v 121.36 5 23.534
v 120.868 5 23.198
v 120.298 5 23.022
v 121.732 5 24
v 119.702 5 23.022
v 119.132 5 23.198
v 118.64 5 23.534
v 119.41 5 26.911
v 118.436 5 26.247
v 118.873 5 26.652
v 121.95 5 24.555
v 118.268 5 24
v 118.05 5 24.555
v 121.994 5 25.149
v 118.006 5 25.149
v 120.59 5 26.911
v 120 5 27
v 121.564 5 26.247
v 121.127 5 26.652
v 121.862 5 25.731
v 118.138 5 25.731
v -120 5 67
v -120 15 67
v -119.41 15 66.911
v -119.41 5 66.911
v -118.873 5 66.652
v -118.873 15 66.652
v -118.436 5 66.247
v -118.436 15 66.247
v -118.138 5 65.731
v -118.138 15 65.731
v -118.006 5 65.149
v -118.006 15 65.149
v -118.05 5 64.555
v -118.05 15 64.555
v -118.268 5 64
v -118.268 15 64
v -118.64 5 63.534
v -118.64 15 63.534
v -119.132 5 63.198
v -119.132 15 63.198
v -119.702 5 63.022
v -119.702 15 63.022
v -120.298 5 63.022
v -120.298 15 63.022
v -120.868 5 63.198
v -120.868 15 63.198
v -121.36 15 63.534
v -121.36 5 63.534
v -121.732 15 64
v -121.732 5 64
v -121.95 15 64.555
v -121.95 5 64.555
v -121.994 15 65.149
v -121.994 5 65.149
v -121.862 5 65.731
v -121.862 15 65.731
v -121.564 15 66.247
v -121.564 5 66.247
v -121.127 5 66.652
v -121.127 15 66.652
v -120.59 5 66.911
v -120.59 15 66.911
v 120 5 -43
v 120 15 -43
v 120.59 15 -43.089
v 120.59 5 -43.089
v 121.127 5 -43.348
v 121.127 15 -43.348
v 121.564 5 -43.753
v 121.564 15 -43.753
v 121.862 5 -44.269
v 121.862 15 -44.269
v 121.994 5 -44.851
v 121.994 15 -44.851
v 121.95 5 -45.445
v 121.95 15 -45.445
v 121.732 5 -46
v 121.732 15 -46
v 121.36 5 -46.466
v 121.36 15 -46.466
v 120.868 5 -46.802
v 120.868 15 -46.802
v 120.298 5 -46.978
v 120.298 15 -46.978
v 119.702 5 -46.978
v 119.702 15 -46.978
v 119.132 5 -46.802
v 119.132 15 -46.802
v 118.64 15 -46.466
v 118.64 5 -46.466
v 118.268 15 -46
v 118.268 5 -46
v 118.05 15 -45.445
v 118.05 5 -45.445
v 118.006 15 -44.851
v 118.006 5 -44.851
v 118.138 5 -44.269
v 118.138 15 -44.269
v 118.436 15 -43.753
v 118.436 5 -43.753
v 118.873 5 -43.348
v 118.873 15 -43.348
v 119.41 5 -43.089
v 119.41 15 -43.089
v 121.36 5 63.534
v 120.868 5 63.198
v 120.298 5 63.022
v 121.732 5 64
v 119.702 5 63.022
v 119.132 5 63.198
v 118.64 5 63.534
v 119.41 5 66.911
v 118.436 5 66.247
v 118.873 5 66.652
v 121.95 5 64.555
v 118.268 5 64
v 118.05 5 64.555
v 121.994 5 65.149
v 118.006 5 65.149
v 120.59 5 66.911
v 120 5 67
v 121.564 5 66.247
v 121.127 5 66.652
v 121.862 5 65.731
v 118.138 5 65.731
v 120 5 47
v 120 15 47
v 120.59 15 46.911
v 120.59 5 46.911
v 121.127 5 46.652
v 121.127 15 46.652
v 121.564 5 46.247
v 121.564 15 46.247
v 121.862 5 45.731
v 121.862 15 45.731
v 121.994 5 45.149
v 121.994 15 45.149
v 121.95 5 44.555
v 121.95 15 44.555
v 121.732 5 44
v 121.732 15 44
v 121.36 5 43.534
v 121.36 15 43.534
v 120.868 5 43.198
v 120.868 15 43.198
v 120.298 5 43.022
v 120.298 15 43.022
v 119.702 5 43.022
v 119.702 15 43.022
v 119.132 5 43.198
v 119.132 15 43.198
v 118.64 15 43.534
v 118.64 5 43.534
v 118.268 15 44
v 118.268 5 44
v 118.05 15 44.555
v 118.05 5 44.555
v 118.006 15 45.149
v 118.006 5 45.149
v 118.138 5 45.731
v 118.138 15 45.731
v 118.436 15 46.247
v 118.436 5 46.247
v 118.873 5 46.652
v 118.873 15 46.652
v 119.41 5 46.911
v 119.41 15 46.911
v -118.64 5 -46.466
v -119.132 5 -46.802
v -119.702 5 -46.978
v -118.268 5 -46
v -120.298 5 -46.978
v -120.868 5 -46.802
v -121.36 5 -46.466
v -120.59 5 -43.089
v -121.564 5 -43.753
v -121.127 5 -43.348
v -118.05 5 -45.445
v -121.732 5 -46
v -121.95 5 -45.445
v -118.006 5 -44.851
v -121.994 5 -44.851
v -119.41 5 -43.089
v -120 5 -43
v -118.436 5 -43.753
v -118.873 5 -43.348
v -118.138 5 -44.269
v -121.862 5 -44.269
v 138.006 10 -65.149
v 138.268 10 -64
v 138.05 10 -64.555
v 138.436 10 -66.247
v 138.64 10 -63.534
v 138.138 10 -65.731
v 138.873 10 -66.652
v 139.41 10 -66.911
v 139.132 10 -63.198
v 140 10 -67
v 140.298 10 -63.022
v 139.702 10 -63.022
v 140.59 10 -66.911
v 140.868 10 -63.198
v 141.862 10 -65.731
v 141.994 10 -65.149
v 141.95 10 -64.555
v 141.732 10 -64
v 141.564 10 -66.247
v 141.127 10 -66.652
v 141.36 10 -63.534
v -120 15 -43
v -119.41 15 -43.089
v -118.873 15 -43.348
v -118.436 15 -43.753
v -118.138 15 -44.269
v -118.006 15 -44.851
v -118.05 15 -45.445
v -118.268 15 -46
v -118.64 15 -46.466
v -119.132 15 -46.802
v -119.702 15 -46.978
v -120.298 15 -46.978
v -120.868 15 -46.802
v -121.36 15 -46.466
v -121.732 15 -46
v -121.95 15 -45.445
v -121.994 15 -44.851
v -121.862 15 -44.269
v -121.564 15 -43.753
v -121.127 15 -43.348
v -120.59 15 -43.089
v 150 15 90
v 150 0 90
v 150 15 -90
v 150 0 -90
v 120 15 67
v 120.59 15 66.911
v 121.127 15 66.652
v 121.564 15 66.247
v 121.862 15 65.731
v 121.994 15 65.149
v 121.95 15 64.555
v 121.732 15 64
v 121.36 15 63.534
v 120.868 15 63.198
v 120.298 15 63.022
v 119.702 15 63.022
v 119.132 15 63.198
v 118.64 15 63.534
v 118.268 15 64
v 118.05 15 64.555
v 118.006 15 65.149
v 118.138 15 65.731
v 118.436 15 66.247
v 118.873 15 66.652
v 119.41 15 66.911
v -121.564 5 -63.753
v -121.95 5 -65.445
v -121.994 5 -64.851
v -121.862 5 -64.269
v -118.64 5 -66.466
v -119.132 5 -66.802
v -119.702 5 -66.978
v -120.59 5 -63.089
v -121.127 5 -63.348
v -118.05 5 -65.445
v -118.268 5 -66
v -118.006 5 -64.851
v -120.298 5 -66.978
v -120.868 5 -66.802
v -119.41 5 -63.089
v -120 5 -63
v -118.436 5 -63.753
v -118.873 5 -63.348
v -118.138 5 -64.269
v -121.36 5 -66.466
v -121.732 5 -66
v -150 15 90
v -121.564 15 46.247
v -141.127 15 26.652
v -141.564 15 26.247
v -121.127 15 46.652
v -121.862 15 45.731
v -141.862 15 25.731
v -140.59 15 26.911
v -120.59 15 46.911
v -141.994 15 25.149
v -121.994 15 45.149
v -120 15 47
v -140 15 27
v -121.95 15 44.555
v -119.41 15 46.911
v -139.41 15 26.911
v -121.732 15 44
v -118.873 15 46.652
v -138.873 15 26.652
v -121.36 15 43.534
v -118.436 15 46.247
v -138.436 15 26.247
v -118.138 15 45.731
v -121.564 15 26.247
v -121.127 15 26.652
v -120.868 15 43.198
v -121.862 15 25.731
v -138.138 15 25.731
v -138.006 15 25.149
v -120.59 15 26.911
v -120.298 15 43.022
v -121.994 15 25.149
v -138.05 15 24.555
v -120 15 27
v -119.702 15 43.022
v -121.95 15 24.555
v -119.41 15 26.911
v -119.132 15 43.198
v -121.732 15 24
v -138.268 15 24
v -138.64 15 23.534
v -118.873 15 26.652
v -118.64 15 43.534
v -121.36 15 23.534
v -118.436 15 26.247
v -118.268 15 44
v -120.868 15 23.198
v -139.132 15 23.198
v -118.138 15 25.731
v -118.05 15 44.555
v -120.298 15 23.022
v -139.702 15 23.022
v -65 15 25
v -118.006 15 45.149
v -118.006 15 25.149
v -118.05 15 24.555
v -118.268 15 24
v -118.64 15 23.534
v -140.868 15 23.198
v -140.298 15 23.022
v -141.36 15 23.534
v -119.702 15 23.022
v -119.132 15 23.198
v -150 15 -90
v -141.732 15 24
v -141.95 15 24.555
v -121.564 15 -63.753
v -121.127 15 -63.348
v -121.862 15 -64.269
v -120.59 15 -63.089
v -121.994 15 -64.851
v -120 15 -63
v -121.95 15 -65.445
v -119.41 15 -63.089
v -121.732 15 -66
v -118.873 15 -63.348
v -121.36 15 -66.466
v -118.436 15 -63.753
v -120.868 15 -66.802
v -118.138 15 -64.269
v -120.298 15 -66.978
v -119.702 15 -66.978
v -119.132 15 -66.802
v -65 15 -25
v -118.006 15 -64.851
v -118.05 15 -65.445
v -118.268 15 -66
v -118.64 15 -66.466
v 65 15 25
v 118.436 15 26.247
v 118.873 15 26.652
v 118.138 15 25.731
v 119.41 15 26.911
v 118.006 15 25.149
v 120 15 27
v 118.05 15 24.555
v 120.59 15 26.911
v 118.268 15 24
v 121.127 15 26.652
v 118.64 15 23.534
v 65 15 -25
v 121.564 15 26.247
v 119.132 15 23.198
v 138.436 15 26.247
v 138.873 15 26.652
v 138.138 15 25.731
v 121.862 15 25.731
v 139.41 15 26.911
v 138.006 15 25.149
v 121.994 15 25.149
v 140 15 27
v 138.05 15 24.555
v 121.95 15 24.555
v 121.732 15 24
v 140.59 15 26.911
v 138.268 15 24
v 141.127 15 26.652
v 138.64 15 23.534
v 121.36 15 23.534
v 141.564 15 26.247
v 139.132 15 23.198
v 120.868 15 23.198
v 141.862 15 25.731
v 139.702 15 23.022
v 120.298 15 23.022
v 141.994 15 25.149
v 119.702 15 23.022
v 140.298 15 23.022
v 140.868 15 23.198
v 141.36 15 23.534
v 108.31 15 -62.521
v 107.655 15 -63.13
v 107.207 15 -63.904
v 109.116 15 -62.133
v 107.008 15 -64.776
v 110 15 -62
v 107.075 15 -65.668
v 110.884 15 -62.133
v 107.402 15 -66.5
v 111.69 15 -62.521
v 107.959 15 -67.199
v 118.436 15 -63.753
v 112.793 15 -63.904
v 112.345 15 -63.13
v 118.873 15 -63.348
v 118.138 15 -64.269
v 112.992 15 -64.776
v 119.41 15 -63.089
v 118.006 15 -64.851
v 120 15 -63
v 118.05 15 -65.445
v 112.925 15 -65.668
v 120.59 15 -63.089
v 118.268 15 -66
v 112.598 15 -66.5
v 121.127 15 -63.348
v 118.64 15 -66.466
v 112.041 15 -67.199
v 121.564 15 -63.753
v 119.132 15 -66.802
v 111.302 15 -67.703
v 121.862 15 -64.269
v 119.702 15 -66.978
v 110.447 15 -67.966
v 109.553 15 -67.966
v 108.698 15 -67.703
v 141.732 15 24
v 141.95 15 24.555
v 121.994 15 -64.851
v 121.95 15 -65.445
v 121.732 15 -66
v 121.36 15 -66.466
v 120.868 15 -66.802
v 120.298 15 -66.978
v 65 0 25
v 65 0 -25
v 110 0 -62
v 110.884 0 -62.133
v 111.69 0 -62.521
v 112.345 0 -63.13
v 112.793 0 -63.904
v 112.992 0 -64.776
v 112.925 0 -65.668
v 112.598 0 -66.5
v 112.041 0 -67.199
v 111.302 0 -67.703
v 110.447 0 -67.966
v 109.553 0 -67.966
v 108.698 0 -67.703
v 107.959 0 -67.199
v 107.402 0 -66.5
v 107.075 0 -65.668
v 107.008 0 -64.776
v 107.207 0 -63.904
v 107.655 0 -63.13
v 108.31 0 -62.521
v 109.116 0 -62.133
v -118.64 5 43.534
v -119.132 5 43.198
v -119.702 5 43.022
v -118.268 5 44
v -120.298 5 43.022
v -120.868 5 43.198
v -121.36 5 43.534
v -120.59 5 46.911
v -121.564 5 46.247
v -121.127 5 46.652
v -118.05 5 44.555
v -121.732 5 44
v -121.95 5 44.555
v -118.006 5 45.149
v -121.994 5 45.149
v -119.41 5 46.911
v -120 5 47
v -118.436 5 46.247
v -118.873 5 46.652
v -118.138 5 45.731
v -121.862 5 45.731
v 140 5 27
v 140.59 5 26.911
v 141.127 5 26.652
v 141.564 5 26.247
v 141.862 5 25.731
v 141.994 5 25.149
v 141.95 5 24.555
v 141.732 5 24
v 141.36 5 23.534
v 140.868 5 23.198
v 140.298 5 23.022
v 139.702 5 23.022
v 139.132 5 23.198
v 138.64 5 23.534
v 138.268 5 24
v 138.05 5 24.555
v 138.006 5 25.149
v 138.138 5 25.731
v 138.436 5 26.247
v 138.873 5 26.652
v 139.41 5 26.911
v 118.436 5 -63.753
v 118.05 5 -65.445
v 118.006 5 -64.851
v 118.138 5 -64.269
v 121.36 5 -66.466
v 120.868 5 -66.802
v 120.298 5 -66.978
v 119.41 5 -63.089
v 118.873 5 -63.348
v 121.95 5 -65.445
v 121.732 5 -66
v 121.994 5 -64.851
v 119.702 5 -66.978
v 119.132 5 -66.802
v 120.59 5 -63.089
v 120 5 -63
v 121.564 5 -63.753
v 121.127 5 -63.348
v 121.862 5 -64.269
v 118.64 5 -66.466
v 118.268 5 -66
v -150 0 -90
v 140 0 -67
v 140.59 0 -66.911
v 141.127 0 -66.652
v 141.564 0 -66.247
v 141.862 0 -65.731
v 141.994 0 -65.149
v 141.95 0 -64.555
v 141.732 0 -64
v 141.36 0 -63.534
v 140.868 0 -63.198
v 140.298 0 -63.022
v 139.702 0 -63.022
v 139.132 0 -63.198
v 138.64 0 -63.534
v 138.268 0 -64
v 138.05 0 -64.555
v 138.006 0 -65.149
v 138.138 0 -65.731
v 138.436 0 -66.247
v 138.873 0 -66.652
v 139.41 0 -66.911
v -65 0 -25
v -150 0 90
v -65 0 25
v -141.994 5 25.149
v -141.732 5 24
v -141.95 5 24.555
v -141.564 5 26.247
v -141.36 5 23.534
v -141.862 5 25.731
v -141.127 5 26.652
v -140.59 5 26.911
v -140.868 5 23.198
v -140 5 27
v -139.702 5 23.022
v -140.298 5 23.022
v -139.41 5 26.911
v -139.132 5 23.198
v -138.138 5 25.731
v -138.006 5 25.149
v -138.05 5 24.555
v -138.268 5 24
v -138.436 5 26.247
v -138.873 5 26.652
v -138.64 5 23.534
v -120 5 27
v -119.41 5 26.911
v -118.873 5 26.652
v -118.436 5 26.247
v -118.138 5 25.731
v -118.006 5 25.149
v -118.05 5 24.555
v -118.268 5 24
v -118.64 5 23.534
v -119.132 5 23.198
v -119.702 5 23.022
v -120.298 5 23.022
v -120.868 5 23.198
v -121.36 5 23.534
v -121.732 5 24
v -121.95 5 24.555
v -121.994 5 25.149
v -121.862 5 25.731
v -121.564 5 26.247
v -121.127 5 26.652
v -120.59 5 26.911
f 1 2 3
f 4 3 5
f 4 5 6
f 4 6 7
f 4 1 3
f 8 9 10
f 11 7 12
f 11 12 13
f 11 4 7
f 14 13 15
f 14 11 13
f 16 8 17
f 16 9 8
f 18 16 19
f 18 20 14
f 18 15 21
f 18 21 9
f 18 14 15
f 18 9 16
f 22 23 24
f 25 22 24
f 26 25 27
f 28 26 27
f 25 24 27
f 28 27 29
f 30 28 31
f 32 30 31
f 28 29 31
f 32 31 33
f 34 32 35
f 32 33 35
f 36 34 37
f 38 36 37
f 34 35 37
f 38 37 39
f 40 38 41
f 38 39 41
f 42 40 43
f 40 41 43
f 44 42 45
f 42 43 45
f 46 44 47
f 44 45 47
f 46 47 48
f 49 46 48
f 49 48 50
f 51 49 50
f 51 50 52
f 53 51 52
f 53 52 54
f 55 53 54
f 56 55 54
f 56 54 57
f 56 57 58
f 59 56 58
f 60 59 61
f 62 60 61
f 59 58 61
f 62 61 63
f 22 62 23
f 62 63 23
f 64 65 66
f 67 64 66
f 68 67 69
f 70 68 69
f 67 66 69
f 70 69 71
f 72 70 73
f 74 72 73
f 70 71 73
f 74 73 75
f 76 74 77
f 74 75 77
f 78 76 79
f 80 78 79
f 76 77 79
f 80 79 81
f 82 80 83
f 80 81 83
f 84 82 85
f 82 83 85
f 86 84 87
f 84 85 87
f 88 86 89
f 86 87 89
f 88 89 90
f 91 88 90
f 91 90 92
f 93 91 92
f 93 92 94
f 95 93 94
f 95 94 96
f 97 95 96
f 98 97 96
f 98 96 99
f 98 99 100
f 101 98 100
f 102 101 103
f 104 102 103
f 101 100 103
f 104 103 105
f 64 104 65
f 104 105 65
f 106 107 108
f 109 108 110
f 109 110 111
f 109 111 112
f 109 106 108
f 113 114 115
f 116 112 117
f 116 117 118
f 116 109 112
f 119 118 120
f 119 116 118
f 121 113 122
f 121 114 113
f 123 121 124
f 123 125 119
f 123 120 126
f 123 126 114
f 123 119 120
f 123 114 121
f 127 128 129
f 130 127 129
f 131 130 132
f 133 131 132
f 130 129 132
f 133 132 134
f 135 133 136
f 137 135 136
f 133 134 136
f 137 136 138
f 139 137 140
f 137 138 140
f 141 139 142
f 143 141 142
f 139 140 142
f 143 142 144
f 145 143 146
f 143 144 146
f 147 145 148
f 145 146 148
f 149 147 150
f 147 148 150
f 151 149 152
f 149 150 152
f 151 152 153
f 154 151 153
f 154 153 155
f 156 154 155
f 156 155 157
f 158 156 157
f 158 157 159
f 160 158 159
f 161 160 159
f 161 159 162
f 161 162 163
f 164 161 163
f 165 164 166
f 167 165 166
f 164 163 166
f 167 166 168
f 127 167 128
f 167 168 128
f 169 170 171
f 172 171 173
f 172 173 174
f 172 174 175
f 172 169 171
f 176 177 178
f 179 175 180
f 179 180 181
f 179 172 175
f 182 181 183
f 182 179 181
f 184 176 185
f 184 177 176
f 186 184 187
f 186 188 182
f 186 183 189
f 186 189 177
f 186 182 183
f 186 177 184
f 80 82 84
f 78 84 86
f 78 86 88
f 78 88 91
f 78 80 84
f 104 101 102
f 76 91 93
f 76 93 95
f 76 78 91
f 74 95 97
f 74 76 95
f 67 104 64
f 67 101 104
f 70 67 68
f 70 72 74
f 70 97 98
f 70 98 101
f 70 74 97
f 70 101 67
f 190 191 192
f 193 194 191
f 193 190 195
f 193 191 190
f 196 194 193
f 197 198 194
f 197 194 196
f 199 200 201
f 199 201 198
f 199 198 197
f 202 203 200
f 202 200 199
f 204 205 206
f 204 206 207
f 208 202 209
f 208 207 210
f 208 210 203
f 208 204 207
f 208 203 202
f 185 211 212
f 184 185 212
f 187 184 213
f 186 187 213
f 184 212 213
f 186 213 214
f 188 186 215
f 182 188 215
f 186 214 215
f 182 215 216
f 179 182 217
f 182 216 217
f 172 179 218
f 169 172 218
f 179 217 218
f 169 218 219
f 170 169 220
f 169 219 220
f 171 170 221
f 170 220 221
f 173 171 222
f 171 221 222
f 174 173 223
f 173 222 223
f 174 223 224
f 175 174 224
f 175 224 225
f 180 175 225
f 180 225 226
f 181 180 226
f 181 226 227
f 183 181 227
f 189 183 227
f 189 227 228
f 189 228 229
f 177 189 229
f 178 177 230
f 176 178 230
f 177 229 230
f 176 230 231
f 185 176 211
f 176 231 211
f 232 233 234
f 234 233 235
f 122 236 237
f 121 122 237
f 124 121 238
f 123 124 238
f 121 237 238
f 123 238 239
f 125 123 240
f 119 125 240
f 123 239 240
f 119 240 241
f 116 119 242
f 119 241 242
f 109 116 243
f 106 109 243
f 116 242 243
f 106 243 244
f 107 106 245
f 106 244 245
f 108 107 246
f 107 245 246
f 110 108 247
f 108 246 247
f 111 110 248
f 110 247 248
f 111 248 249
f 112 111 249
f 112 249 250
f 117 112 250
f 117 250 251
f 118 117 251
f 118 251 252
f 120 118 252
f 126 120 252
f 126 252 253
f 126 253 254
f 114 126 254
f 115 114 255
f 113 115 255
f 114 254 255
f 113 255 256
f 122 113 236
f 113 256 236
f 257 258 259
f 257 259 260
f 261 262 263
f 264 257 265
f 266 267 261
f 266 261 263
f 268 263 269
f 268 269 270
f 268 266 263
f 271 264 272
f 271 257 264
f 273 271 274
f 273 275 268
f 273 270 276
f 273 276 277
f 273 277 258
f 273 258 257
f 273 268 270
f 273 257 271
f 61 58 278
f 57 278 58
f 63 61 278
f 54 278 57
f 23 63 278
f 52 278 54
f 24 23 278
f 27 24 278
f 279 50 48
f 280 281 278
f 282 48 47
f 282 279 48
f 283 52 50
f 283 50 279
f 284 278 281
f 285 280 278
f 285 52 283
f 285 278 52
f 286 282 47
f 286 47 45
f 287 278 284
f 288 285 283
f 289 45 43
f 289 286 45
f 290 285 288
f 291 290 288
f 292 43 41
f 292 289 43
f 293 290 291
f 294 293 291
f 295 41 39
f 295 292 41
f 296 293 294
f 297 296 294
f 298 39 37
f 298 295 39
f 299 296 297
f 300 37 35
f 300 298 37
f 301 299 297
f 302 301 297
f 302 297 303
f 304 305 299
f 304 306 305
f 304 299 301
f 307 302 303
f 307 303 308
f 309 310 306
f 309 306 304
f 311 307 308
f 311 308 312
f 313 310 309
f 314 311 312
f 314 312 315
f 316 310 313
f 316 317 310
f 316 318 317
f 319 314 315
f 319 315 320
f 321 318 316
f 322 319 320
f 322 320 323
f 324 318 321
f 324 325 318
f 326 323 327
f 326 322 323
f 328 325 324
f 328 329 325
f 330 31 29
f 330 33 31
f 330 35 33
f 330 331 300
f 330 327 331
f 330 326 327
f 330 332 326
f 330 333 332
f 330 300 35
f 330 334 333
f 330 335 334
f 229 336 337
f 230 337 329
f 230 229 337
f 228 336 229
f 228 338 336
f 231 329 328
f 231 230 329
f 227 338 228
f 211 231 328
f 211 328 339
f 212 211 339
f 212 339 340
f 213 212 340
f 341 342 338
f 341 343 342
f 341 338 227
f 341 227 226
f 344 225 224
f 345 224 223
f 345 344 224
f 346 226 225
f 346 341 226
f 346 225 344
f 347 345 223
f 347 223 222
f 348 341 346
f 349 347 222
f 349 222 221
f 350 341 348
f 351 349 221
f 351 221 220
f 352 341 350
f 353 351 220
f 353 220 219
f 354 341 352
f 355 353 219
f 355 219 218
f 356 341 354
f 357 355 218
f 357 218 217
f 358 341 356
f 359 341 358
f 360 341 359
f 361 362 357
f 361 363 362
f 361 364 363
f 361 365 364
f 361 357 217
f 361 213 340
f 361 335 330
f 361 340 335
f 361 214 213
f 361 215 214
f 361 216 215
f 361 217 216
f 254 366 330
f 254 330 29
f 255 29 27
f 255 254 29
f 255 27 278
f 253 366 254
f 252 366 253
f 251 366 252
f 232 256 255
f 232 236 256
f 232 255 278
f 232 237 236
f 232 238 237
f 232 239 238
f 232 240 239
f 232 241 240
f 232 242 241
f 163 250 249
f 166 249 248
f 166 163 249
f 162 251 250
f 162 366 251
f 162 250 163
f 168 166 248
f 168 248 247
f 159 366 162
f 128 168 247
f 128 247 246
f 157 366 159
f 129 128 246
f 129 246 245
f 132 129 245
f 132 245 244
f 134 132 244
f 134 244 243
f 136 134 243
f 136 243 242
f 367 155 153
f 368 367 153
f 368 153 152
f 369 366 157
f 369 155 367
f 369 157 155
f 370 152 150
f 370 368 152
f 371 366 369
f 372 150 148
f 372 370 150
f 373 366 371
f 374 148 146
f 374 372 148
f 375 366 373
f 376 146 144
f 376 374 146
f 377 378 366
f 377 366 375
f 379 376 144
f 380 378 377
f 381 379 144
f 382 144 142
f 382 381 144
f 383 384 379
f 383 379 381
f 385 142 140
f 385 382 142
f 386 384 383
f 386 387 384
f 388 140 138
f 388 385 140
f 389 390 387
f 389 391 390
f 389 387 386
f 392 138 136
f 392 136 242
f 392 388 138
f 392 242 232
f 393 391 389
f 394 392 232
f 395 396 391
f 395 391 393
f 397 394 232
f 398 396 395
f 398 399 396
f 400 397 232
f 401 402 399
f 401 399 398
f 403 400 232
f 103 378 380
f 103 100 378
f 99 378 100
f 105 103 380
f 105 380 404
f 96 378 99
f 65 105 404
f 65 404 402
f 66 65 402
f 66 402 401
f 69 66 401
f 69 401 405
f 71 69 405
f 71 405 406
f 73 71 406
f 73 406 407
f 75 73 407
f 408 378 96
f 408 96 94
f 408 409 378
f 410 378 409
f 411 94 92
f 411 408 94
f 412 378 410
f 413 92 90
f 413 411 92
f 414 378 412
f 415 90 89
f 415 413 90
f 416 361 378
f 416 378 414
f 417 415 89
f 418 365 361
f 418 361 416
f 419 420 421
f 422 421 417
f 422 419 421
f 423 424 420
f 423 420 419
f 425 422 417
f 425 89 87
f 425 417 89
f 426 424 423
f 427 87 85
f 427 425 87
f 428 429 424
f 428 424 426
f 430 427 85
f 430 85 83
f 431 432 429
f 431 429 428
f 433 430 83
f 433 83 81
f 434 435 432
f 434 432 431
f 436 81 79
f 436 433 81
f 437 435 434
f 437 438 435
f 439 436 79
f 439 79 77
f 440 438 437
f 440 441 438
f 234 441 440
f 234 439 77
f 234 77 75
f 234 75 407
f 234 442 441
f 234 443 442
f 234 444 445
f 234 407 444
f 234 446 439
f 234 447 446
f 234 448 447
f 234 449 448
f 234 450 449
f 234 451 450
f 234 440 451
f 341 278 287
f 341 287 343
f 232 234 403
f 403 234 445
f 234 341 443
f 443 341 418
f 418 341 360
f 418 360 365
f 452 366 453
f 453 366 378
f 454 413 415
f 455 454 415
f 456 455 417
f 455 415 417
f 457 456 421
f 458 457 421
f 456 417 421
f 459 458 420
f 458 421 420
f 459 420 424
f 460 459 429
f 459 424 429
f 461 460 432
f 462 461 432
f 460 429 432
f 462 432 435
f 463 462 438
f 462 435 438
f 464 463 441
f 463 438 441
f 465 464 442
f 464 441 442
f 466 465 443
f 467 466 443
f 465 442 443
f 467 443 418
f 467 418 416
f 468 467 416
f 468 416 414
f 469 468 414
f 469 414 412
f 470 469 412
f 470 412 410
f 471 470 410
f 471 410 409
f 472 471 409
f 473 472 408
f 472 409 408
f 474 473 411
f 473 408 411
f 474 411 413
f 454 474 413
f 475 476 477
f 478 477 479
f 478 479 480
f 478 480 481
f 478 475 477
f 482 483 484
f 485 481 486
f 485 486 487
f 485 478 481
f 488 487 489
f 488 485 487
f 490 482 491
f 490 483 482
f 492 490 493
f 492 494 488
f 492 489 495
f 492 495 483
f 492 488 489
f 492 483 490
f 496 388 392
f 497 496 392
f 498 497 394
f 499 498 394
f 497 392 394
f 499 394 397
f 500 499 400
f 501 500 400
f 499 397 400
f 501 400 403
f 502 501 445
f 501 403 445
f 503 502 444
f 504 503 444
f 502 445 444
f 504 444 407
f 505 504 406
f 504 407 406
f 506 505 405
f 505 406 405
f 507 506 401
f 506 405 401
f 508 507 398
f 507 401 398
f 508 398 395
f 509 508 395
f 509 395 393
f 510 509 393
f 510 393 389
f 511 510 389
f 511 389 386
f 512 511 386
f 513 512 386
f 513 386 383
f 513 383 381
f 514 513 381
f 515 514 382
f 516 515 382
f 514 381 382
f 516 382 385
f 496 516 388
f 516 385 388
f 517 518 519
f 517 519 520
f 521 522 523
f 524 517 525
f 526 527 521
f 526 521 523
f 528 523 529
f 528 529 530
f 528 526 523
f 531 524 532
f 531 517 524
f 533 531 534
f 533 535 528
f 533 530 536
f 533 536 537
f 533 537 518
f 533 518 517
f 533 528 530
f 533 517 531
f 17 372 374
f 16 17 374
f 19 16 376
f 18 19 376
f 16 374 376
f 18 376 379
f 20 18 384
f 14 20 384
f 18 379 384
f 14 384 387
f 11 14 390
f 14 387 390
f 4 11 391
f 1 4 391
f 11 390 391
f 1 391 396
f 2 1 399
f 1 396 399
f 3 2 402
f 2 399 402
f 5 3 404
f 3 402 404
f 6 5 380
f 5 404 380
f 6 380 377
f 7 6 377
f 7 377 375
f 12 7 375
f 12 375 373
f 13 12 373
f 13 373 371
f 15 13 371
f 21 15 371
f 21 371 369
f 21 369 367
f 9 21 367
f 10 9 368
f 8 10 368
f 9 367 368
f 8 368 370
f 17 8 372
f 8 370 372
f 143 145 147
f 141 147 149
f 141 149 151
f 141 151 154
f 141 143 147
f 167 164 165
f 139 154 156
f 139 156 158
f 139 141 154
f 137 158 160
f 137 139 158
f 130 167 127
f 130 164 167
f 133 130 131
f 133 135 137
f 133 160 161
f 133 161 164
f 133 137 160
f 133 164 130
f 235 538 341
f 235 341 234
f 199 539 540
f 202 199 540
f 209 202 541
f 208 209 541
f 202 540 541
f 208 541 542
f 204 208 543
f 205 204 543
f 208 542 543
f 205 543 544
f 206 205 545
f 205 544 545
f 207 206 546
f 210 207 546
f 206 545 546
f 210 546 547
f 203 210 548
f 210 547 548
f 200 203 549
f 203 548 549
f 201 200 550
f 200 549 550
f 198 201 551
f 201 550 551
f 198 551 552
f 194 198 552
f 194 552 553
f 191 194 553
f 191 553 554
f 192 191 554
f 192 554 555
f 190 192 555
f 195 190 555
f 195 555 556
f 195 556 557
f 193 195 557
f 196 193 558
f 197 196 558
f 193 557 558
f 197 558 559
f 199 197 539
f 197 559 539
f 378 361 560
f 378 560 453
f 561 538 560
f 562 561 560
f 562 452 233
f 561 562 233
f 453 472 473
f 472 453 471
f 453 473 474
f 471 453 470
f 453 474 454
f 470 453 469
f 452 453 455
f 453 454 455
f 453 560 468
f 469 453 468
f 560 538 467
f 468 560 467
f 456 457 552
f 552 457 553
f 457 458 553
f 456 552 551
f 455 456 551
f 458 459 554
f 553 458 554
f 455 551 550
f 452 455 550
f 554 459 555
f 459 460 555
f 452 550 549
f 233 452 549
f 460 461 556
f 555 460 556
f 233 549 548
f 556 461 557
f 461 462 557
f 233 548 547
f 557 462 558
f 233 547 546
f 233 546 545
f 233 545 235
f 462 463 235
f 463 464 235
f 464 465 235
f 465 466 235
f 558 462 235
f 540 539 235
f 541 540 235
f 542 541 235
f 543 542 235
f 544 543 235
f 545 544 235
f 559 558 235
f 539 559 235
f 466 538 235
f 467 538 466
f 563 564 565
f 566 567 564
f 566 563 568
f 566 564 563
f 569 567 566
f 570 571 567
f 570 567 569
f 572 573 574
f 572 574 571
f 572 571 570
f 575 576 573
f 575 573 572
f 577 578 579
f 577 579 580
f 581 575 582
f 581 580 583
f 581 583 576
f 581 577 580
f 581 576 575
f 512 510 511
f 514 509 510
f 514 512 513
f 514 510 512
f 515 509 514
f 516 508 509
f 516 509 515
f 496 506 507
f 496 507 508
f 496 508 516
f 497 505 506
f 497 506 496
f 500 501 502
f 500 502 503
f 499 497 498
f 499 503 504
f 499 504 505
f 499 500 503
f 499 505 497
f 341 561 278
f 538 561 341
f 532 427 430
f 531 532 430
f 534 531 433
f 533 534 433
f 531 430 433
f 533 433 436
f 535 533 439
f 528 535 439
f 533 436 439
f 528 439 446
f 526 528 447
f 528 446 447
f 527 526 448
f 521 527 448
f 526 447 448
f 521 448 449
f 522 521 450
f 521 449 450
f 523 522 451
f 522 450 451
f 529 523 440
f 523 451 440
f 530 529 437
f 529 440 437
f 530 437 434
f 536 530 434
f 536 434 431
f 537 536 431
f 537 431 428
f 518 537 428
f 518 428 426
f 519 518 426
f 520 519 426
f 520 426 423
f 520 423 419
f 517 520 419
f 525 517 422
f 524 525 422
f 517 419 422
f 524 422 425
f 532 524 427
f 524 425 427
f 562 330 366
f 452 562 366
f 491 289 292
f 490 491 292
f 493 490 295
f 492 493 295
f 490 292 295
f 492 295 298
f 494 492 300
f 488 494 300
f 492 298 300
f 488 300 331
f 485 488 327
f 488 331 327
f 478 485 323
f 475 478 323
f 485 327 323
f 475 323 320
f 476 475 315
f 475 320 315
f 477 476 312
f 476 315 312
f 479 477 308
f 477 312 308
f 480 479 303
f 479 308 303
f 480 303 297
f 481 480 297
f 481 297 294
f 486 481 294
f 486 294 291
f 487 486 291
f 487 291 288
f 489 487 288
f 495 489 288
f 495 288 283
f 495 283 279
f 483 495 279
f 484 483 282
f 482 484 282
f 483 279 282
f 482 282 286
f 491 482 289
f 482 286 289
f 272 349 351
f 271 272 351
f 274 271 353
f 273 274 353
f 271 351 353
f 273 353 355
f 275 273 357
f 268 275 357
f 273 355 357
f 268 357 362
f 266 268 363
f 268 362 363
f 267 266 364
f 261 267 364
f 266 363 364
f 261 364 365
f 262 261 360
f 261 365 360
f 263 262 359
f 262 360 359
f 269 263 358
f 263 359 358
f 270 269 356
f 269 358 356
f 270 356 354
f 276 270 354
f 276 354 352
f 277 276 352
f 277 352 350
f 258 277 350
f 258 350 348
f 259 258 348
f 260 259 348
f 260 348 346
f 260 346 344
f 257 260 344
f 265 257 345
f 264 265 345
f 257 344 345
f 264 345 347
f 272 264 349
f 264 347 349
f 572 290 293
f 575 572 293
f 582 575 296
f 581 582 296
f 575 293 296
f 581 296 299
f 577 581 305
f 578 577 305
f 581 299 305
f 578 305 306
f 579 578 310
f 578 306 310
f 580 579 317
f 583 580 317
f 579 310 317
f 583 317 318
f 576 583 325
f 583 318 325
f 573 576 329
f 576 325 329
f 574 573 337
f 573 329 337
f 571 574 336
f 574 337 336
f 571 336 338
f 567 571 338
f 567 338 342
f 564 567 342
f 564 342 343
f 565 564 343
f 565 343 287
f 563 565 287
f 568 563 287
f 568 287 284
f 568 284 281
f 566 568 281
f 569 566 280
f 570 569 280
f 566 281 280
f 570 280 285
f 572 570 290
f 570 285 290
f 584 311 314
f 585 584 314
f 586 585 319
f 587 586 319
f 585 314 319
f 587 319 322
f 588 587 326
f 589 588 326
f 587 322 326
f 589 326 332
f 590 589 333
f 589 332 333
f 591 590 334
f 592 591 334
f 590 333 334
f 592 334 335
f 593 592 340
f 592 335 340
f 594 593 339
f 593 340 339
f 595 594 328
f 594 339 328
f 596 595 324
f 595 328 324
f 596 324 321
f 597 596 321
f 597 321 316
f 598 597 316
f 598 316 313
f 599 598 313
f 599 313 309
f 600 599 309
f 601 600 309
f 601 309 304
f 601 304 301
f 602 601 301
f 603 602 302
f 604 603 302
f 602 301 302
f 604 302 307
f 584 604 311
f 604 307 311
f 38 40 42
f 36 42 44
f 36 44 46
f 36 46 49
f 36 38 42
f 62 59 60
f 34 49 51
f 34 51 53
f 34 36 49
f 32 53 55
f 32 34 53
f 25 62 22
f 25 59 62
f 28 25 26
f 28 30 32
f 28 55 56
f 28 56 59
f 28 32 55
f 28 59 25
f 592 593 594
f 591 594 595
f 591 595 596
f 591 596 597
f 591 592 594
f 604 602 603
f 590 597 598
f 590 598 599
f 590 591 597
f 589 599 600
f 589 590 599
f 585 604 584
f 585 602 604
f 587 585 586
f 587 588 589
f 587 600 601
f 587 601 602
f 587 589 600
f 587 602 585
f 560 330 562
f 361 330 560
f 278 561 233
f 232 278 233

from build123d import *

# Parameters (mm, degrees)
CROQUIS1_W              = 300
CROQUIS1_H              = 180
SALIENTE_EXTRUIR1_DEPTH = 15
CROQUIS2_R              = 2
CORTAR_EXTRUIR1_DEPTH   = 10
CROQUIS3_R              = 3
CROQUIS3_W              = 130
CROQUIS3_H              = 50
CORTAR_EXTRUIR2_DEPTH   = 15
CROQUIS4_R              = 2
CORTAR_EXTRUIR3_DEPTH   = 10


with BuildPart() as part:
    # Croquis1 → Saliente-Extruir1 (new body)
    with BuildSketch(Plane(origin=(0, 0, 0), x_dir=(1, 0, 0), z_dir=(0, 1, 0))):
        Rectangle(CROQUIS1_W, CROQUIS1_H)
    extrude(amount=SALIENTE_EXTRUIR1_DEPTH)

    # Croquis2 → Cortar-Extruir1 (cut)
    with BuildSketch(Plane(origin=(0, 15, 0), x_dir=(1, 0, 0), z_dir=(0, 1, 0))):
        with Locations(Location((-120, -45, 0), (0, 0, 270))):
            Circle(CROQUIS2_R)
        with Locations(Location((-120, -65, 0), (0, 0, 270))):
            Circle(CROQUIS2_R)
        with Locations(Location((120, -45, 0), (0, 0, 270))):
            Circle(CROQUIS2_R)
        with Locations(Location((120, -65, 0), (0, 0, 270))):
            Circle(CROQUIS2_R)
        with Locations(Location((-140, -25, 0), (0, 0, 270))):
            Circle(CROQUIS2_R)
        with Locations(Location((-120, -25, 0), (0, 0, 270))):
            Circle(CROQUIS2_R)
        with Locations(Location((120, -25, 0), (0, 0, 270))):
            Circle(CROQUIS2_R)
        with Locations(Location((140, -25, 0), (0, 0, 270))):
            Circle(CROQUIS2_R)
        with Locations(Location((-120, 65, 0), (0, 0, 270))):
            Circle(CROQUIS2_R)
        with Locations(Location((-120, 45, 0), (0, 0, 270))):
            Circle(CROQUIS2_R)
        with Locations(Location((120, 45, 0), (0, 0, 270))):
            Circle(CROQUIS2_R)
        with Locations(Location((120, 65, 0), (0, 0, 270))):
            Circle(CROQUIS2_R)
    extrude(amount=-CORTAR_EXTRUIR1_DEPTH, mode=Mode.SUBTRACT)

    # Croquis3 → Cortar-Extruir2 (cut)
    with BuildSketch(Plane(origin=(0, 15, 0), x_dir=(1, 0, 0), z_dir=(0, 1, 0))):
        with Locations(Location((110, 65, 0), (0, 0, 270))):
            Circle(CROQUIS3_R)
        Rectangle(CROQUIS3_W, CROQUIS3_H)
    extrude(amount=-CORTAR_EXTRUIR2_DEPTH, mode=Mode.SUBTRACT)

    # Croquis4 → Cortar-Extruir3 (cut)
    with BuildSketch(Plane.XZ):
        with Locations(Location((140, -65, 0), (0, 0, 270))):
            Circle(CROQUIS4_R)
    extrude(amount=-CORTAR_EXTRUIR3_DEPTH, mode=Mode.SUBTRACT)


solid = part.part
